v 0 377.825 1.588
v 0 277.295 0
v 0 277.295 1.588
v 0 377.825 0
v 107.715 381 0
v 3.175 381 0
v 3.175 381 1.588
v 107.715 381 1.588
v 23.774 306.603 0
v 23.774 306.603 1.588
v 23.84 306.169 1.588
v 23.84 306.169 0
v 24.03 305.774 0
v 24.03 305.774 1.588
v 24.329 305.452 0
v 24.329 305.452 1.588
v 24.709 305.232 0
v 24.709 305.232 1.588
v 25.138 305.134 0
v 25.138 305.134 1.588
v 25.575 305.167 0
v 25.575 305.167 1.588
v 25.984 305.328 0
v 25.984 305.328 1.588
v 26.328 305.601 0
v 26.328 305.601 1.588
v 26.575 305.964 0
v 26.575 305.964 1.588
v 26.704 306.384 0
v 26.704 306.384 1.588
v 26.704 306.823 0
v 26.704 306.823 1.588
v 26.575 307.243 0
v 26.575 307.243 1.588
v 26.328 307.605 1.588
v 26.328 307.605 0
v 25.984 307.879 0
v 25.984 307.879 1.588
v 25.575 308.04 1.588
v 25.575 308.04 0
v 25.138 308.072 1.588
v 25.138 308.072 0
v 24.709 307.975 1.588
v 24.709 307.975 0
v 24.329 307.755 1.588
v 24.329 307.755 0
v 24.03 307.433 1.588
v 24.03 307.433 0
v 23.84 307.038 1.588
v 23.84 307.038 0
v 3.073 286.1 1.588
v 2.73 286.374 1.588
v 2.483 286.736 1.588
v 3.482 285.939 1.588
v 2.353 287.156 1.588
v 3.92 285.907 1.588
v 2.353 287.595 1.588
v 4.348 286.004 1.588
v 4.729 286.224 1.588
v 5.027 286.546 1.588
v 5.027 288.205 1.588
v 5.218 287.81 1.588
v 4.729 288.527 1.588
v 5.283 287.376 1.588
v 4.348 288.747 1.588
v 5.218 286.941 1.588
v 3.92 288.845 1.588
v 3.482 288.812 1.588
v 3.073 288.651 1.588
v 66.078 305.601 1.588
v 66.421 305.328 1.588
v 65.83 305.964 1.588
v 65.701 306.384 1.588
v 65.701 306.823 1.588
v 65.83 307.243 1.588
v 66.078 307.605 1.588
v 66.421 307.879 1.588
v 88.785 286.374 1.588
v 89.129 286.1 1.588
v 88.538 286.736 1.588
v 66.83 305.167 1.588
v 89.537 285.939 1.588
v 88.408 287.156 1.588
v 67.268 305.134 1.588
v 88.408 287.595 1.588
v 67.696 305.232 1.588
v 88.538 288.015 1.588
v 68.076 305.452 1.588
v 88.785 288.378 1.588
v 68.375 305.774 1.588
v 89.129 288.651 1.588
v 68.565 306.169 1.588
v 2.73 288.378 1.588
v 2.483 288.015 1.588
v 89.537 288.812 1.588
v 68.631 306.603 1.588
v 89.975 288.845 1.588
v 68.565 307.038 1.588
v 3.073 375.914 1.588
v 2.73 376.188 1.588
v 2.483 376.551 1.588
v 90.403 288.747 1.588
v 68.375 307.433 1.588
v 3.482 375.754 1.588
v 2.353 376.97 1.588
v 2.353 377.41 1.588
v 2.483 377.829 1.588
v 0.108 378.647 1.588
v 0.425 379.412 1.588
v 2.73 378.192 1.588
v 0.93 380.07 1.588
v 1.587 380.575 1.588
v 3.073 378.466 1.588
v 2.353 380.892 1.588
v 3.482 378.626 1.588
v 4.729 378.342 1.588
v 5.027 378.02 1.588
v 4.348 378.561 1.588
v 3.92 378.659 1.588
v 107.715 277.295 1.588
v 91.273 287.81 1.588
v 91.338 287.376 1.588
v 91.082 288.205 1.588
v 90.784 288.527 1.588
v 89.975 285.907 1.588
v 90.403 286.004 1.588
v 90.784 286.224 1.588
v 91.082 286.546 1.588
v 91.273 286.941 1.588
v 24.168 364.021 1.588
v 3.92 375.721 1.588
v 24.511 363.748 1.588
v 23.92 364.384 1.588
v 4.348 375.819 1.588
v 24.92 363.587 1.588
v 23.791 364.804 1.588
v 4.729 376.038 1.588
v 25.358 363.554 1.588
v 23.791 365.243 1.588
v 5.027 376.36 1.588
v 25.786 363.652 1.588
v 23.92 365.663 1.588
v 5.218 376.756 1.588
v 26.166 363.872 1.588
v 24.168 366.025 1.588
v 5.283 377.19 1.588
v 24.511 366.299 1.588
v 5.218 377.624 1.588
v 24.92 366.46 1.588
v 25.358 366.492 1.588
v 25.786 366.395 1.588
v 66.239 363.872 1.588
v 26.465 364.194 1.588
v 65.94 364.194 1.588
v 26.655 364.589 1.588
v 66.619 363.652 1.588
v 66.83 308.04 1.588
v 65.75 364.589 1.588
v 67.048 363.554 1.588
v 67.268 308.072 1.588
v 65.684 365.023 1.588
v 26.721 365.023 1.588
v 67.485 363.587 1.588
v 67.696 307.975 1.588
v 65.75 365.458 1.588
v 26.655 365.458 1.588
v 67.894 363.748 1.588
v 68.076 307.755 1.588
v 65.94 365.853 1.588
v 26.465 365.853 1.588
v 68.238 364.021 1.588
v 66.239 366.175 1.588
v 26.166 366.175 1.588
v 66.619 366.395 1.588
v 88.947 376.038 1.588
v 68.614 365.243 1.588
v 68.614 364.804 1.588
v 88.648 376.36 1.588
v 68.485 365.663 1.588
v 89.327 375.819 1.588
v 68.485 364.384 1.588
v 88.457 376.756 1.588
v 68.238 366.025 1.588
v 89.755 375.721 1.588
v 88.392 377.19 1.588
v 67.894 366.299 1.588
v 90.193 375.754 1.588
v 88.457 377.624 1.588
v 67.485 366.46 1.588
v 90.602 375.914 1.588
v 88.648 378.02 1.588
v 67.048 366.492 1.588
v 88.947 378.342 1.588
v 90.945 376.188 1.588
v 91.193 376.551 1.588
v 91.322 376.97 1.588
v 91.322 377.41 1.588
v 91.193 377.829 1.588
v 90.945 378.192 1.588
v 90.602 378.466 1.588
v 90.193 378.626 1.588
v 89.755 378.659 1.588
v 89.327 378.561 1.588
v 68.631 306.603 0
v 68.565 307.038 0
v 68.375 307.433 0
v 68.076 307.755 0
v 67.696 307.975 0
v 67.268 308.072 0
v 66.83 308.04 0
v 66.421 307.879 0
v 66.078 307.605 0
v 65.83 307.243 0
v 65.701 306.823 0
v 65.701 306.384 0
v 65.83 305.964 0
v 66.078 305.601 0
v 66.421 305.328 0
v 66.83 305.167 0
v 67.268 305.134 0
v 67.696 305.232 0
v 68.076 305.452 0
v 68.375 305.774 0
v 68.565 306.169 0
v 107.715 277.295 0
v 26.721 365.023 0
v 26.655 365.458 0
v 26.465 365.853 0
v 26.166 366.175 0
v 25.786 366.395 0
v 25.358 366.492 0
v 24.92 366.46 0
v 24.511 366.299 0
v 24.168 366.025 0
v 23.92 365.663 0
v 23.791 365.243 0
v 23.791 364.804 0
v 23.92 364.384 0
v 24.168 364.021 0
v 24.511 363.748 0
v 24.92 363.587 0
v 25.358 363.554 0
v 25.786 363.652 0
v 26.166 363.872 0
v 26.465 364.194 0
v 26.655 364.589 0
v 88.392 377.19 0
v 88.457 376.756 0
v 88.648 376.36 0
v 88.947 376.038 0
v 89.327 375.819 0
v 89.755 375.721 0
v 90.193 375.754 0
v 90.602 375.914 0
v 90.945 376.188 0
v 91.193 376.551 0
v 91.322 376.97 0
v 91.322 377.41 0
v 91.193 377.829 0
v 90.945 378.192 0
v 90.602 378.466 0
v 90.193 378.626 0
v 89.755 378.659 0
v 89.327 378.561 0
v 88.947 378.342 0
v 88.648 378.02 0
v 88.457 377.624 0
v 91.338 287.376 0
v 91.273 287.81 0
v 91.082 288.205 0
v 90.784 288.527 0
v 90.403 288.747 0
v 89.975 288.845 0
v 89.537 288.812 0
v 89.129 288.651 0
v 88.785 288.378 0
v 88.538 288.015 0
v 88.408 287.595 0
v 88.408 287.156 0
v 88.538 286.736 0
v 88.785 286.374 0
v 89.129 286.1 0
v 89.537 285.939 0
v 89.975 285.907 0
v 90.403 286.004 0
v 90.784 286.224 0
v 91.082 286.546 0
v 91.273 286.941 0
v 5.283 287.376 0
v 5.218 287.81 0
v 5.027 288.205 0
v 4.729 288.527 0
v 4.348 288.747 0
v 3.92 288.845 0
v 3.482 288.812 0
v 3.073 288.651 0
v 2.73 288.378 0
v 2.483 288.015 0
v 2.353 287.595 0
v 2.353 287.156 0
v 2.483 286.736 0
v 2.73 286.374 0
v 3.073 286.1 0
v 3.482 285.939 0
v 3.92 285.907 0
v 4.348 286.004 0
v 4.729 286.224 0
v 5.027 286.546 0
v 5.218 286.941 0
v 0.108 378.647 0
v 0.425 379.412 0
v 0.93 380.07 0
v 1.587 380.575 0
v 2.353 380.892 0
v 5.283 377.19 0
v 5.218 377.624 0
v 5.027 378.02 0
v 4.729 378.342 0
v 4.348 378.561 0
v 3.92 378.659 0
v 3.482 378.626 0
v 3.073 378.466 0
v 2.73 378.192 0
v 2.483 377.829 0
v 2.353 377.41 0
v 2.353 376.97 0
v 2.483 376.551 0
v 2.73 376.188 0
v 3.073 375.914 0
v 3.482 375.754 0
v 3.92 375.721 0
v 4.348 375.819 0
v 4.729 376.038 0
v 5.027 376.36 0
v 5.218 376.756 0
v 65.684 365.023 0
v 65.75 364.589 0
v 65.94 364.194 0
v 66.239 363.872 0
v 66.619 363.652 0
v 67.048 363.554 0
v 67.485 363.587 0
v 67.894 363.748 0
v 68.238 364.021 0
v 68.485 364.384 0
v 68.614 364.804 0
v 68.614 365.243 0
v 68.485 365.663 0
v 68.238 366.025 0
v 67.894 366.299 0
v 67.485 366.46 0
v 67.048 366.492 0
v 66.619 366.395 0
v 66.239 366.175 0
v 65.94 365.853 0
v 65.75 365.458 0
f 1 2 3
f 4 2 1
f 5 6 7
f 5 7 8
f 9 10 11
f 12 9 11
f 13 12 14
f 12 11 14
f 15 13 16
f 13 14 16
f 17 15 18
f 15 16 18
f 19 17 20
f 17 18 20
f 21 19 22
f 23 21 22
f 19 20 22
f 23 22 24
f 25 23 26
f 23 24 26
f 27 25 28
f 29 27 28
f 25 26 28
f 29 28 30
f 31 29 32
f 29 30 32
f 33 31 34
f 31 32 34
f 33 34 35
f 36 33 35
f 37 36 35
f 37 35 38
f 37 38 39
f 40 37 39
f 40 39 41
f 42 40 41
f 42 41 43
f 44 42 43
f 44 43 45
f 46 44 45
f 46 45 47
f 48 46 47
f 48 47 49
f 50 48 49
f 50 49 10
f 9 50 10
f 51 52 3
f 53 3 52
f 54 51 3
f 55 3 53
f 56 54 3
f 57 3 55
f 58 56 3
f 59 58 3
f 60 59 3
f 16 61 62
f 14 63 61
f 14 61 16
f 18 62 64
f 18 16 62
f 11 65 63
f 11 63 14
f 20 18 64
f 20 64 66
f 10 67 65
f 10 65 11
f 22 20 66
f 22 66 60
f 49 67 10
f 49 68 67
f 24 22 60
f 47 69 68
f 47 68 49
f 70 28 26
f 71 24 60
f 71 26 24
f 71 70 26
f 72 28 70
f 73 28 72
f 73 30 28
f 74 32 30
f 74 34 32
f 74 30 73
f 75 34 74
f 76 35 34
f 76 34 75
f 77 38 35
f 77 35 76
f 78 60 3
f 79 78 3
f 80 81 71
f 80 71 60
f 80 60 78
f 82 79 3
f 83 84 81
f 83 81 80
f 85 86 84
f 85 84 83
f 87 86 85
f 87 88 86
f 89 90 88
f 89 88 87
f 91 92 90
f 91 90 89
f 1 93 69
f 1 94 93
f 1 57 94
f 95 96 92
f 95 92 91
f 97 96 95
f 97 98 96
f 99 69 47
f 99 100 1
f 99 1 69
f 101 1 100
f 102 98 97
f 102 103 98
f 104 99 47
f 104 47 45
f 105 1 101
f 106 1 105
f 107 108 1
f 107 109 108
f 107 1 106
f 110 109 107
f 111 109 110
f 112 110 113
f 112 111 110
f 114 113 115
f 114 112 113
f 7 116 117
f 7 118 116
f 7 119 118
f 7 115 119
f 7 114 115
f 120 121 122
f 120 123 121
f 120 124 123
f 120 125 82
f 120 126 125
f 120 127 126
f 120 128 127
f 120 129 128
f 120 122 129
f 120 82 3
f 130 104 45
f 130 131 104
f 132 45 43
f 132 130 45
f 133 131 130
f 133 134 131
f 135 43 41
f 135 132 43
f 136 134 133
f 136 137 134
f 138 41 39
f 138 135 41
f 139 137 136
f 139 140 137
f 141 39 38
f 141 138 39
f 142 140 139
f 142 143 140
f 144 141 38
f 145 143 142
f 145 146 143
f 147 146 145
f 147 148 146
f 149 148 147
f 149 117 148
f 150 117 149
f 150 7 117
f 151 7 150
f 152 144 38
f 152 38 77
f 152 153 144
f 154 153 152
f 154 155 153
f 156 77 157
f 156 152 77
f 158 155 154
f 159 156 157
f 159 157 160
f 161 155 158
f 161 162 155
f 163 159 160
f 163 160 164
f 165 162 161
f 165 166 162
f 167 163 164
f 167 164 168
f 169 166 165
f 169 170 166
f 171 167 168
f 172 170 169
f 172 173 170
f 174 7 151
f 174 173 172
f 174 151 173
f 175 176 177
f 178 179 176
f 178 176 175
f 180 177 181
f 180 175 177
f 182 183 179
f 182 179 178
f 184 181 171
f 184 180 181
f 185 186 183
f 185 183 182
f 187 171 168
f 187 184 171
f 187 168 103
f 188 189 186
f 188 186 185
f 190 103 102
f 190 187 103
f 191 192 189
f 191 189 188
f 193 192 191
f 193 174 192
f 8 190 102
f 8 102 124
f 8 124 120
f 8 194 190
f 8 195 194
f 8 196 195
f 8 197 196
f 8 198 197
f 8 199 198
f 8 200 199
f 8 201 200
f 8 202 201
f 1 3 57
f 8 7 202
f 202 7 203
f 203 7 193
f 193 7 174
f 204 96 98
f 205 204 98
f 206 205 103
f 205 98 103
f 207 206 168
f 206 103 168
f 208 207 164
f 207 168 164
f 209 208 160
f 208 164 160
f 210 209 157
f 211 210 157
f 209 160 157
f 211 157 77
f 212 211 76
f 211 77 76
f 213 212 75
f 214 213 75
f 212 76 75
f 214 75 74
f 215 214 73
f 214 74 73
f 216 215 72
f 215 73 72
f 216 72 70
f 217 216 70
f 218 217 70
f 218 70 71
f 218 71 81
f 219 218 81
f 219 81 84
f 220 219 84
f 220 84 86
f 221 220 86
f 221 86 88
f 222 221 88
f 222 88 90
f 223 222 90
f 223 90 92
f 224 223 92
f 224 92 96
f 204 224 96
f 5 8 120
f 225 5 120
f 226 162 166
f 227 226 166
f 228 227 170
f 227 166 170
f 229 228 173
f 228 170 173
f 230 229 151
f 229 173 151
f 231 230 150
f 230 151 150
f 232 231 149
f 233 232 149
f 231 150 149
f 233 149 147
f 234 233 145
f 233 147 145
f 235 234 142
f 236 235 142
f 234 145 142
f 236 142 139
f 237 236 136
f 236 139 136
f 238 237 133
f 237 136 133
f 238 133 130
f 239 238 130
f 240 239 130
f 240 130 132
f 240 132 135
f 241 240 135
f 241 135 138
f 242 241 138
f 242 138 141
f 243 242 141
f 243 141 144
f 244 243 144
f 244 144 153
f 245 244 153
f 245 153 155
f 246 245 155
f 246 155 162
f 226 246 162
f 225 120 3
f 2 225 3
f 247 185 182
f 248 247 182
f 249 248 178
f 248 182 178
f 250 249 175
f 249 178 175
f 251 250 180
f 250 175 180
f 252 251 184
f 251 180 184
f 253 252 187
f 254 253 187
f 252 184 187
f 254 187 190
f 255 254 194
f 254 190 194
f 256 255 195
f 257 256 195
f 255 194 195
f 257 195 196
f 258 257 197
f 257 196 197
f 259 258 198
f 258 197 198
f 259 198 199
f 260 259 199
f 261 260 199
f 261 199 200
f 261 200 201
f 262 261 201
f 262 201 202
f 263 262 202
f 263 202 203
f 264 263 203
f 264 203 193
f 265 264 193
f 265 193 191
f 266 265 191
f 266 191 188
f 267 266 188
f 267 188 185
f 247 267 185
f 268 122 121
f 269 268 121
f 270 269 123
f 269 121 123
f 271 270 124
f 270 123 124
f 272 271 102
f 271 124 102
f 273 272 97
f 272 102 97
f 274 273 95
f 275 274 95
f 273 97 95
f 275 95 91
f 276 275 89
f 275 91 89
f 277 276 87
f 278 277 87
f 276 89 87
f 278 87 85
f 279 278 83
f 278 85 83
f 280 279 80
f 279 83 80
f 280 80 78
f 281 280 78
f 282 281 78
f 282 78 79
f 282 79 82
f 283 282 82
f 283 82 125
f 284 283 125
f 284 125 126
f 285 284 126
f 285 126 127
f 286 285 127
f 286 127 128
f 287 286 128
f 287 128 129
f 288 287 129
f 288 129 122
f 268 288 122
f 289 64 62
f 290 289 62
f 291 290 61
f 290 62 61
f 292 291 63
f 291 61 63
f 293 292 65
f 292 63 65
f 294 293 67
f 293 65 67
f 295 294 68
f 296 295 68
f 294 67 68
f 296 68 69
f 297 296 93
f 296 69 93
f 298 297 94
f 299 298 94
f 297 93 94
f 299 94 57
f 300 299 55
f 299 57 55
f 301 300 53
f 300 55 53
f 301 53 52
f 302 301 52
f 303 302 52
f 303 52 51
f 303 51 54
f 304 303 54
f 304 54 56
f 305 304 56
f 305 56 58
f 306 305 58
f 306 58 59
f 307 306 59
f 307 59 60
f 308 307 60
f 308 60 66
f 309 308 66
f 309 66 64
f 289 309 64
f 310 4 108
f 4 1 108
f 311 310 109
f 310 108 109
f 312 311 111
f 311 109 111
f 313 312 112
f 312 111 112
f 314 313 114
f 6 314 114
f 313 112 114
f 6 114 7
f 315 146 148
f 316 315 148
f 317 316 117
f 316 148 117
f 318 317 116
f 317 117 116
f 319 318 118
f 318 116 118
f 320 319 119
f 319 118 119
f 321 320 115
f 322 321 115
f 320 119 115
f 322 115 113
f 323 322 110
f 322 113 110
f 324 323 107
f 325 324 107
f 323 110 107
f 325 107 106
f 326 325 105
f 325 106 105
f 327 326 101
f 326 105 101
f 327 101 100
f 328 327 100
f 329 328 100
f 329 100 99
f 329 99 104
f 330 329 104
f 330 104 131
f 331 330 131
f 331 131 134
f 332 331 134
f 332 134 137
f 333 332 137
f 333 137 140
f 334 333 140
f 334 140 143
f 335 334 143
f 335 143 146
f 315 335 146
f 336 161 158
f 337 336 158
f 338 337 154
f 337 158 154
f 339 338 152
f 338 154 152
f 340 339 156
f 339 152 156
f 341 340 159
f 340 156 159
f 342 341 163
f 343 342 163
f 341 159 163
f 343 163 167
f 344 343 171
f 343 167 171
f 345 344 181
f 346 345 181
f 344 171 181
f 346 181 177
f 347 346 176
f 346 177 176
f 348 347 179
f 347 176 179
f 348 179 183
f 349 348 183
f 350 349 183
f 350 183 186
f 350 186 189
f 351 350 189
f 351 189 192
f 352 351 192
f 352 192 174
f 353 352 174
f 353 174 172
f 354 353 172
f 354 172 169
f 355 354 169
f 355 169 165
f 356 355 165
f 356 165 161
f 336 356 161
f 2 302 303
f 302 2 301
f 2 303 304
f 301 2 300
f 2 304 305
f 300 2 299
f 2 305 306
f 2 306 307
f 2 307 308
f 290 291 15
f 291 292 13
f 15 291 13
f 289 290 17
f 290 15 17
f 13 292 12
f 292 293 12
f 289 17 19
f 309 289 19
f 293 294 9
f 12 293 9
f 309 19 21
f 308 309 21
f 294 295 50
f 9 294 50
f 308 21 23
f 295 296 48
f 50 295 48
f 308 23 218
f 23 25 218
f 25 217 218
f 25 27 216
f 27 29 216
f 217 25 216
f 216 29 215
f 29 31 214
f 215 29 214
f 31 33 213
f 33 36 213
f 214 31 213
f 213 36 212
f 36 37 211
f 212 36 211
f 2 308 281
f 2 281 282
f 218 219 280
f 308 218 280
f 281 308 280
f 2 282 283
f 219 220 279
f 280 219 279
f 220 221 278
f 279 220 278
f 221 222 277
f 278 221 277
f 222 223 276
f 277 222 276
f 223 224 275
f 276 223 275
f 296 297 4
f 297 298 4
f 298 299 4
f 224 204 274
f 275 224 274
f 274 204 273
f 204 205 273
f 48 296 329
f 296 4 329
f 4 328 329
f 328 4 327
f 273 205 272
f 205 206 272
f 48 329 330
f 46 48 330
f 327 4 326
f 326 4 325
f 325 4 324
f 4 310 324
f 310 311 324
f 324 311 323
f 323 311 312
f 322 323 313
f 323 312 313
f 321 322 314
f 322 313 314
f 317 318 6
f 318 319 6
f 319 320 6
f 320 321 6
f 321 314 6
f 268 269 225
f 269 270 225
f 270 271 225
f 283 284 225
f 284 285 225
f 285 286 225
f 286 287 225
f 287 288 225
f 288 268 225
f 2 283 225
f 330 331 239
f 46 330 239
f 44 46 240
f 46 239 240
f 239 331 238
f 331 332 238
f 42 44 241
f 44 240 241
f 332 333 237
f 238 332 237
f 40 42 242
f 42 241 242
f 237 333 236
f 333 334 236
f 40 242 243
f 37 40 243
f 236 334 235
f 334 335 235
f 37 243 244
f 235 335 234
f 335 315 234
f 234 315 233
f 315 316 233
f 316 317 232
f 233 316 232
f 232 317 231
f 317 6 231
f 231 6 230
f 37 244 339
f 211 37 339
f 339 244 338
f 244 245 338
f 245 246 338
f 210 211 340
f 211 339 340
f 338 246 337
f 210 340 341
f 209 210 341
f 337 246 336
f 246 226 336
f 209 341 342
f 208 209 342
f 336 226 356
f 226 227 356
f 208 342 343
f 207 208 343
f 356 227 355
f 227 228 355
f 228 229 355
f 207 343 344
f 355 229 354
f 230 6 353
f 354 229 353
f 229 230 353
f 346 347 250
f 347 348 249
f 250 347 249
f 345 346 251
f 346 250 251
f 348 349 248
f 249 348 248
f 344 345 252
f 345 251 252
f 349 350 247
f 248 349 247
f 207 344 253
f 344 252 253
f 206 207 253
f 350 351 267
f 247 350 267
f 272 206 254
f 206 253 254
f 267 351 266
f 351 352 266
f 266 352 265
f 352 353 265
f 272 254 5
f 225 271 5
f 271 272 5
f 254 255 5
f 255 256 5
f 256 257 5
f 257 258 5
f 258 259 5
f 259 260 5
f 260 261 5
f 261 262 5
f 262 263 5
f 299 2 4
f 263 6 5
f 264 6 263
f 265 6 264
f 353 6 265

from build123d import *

# Parameters (mm, degrees)
SKETCH1_W            = 254
SKETCH1_H            = 381
BOSS_EXTRUDE1_DEPTH  = 1.5875
SKETCH2_R            = 1.4732
CUT_EXTRUDE1_DEPTH   = 458.907763809
FILLET1_R            = 3.175
SKETCH5_R            = 1.4732
CUT_EXTRUDE3_DEPTH   = 458.907763809
LPATTERN1_COUNT      = 4
LPATTERN1_PITCH      = 96.8756
LPATTERN1_COUNT_DIR2 = 2
LPATTERN1_PITCH_DIR2 = 161.5948
CUT_EXTRUDE4_DEPTH   = 458.907763809


with BuildPart() as part:
    # Sketch1 → Boss-Extrude1 (new body)
    with BuildSketch(Plane.XY):
        with Locations((127, 190.5)):
            Rectangle(SKETCH1_W, SKETCH1_H)
    extrude(amount=BOSS_EXTRUDE1_DEPTH)

    # Sketch2 → Cut-Extrude1 (cut, through all)
    with BuildSketch(Plane.XY.offset(1.5875)):
        with Locations((3.81, 377.19)):
            Circle(SKETCH2_R)
        with Locations(Location((89.8652, 377.19, 0), (0, 0, 180))):
            Circle(SKETCH2_R)
        with Locations(Location((164.1348, 377.19, 0), (0, 0, 180))):
            Circle(SKETCH2_R)
        with Locations((250.19, 377.19)):
            Circle(SKETCH2_R)
        with Locations(Location((164.1348, 287.375451288, 0), (0, 0, 180))):
            Circle(SKETCH2_R)
        with Locations((3.81, 287.3756)):
            Circle(SKETCH2_R)
        with Locations((250.19, 287.3756)):
            Circle(SKETCH2_R)
        with Locations((89.8652, 287.3756)):
            Circle(SKETCH2_R)
        with Locations(Location((164.1348, 190.499990436, 0), (0, 0, 180))):
            Circle(SKETCH2_R)
        with Locations((3.81, 191.135)):
            Circle(SKETCH2_R)
        with Locations((250.19, 190.5)):
            Circle(SKETCH2_R)
        with Locations((89.8652, 190.5)):
            Circle(SKETCH2_R)
        with Locations(Location((164.1348, 93.6244, 0), (0, 0, 180))):
            Circle(SKETCH2_R)
        with Locations((3.81, 93.6244)):
            Circle(SKETCH2_R)
        with Locations((250.19, 93.6244)):
            Circle(SKETCH2_R)
        with Locations((89.8652, 93.6244)):
            Circle(SKETCH2_R)
        with Locations(Location((164.1348, 3.81, 0), (0, 0, 180))):
            Circle(SKETCH2_R)
        with Locations((3.81, 3.81)):
            Circle(SKETCH2_R)
        with Locations((250.19, 3.81)):
            Circle(SKETCH2_R)
        with Locations((89.8652, 3.81)):
            Circle(SKETCH2_R)
    extrude(amount=-CUT_EXTRUDE1_DEPTH, mode=Mode.SUBTRACT)

    # Fillet1
    fillet1_edges = [part.edges().sort_by_distance(p)[0] for p in [
        (0, 381, 0.79375),
        (254, 381, 0.79375),
        (254, 0, 0.79375),
        (0, 0, 0.79375),
    ]]
    fillet(fillet1_edges, radius=FILLET1_R)

    # Sketch5 → Cut-Extrude3 (cut, through all)
    with BuildSketch(Plane.XY.offset(1.5875)):
        with Locations((25.2476, 74.3966)):
            Circle(SKETCH5_R)
        with Locations(Location((67.1576, 74.3966, 0), (0, 0, 180))):
            Circle(SKETCH5_R)
        with Locations((67.1576, 15.9766)):
            Circle(SKETCH5_R)
        with Locations(Location((25.2476, 15.9766, 0), (0, 0, 180))):
            Circle(SKETCH5_R)
    cut_extrude3 = extrude(amount=-CUT_EXTRUDE3_DEPTH, mode=Mode.SUBTRACT)

    # LPattern1: Cut-Extrude3 4 × 2
    with Locations(*[(j * LPATTERN1_PITCH_DIR2, i * LPATTERN1_PITCH, 0) for i in range(LPATTERN1_COUNT) for j in range(LPATTERN1_COUNT_DIR2) if (i, j) != (0, 0)]):
        add(cut_extrude3, mode=Mode.SUBTRACT)

    # Sketch6 → Cut-Extrude4 (cut, through all)
    with BuildSketch(Plane.XY.offset(1.5875)):
        Polygon((295.552123895, 381), (107.714500619, 381), (107.714500619, 277.29497196), (0, 277.29497196), (0, -37.89474057), (295.552123895, -37.89474057), align=None)
    extrude(amount=-CUT_EXTRUDE4_DEPTH, mode=Mode.SUBTRACT)


solid = part.part
